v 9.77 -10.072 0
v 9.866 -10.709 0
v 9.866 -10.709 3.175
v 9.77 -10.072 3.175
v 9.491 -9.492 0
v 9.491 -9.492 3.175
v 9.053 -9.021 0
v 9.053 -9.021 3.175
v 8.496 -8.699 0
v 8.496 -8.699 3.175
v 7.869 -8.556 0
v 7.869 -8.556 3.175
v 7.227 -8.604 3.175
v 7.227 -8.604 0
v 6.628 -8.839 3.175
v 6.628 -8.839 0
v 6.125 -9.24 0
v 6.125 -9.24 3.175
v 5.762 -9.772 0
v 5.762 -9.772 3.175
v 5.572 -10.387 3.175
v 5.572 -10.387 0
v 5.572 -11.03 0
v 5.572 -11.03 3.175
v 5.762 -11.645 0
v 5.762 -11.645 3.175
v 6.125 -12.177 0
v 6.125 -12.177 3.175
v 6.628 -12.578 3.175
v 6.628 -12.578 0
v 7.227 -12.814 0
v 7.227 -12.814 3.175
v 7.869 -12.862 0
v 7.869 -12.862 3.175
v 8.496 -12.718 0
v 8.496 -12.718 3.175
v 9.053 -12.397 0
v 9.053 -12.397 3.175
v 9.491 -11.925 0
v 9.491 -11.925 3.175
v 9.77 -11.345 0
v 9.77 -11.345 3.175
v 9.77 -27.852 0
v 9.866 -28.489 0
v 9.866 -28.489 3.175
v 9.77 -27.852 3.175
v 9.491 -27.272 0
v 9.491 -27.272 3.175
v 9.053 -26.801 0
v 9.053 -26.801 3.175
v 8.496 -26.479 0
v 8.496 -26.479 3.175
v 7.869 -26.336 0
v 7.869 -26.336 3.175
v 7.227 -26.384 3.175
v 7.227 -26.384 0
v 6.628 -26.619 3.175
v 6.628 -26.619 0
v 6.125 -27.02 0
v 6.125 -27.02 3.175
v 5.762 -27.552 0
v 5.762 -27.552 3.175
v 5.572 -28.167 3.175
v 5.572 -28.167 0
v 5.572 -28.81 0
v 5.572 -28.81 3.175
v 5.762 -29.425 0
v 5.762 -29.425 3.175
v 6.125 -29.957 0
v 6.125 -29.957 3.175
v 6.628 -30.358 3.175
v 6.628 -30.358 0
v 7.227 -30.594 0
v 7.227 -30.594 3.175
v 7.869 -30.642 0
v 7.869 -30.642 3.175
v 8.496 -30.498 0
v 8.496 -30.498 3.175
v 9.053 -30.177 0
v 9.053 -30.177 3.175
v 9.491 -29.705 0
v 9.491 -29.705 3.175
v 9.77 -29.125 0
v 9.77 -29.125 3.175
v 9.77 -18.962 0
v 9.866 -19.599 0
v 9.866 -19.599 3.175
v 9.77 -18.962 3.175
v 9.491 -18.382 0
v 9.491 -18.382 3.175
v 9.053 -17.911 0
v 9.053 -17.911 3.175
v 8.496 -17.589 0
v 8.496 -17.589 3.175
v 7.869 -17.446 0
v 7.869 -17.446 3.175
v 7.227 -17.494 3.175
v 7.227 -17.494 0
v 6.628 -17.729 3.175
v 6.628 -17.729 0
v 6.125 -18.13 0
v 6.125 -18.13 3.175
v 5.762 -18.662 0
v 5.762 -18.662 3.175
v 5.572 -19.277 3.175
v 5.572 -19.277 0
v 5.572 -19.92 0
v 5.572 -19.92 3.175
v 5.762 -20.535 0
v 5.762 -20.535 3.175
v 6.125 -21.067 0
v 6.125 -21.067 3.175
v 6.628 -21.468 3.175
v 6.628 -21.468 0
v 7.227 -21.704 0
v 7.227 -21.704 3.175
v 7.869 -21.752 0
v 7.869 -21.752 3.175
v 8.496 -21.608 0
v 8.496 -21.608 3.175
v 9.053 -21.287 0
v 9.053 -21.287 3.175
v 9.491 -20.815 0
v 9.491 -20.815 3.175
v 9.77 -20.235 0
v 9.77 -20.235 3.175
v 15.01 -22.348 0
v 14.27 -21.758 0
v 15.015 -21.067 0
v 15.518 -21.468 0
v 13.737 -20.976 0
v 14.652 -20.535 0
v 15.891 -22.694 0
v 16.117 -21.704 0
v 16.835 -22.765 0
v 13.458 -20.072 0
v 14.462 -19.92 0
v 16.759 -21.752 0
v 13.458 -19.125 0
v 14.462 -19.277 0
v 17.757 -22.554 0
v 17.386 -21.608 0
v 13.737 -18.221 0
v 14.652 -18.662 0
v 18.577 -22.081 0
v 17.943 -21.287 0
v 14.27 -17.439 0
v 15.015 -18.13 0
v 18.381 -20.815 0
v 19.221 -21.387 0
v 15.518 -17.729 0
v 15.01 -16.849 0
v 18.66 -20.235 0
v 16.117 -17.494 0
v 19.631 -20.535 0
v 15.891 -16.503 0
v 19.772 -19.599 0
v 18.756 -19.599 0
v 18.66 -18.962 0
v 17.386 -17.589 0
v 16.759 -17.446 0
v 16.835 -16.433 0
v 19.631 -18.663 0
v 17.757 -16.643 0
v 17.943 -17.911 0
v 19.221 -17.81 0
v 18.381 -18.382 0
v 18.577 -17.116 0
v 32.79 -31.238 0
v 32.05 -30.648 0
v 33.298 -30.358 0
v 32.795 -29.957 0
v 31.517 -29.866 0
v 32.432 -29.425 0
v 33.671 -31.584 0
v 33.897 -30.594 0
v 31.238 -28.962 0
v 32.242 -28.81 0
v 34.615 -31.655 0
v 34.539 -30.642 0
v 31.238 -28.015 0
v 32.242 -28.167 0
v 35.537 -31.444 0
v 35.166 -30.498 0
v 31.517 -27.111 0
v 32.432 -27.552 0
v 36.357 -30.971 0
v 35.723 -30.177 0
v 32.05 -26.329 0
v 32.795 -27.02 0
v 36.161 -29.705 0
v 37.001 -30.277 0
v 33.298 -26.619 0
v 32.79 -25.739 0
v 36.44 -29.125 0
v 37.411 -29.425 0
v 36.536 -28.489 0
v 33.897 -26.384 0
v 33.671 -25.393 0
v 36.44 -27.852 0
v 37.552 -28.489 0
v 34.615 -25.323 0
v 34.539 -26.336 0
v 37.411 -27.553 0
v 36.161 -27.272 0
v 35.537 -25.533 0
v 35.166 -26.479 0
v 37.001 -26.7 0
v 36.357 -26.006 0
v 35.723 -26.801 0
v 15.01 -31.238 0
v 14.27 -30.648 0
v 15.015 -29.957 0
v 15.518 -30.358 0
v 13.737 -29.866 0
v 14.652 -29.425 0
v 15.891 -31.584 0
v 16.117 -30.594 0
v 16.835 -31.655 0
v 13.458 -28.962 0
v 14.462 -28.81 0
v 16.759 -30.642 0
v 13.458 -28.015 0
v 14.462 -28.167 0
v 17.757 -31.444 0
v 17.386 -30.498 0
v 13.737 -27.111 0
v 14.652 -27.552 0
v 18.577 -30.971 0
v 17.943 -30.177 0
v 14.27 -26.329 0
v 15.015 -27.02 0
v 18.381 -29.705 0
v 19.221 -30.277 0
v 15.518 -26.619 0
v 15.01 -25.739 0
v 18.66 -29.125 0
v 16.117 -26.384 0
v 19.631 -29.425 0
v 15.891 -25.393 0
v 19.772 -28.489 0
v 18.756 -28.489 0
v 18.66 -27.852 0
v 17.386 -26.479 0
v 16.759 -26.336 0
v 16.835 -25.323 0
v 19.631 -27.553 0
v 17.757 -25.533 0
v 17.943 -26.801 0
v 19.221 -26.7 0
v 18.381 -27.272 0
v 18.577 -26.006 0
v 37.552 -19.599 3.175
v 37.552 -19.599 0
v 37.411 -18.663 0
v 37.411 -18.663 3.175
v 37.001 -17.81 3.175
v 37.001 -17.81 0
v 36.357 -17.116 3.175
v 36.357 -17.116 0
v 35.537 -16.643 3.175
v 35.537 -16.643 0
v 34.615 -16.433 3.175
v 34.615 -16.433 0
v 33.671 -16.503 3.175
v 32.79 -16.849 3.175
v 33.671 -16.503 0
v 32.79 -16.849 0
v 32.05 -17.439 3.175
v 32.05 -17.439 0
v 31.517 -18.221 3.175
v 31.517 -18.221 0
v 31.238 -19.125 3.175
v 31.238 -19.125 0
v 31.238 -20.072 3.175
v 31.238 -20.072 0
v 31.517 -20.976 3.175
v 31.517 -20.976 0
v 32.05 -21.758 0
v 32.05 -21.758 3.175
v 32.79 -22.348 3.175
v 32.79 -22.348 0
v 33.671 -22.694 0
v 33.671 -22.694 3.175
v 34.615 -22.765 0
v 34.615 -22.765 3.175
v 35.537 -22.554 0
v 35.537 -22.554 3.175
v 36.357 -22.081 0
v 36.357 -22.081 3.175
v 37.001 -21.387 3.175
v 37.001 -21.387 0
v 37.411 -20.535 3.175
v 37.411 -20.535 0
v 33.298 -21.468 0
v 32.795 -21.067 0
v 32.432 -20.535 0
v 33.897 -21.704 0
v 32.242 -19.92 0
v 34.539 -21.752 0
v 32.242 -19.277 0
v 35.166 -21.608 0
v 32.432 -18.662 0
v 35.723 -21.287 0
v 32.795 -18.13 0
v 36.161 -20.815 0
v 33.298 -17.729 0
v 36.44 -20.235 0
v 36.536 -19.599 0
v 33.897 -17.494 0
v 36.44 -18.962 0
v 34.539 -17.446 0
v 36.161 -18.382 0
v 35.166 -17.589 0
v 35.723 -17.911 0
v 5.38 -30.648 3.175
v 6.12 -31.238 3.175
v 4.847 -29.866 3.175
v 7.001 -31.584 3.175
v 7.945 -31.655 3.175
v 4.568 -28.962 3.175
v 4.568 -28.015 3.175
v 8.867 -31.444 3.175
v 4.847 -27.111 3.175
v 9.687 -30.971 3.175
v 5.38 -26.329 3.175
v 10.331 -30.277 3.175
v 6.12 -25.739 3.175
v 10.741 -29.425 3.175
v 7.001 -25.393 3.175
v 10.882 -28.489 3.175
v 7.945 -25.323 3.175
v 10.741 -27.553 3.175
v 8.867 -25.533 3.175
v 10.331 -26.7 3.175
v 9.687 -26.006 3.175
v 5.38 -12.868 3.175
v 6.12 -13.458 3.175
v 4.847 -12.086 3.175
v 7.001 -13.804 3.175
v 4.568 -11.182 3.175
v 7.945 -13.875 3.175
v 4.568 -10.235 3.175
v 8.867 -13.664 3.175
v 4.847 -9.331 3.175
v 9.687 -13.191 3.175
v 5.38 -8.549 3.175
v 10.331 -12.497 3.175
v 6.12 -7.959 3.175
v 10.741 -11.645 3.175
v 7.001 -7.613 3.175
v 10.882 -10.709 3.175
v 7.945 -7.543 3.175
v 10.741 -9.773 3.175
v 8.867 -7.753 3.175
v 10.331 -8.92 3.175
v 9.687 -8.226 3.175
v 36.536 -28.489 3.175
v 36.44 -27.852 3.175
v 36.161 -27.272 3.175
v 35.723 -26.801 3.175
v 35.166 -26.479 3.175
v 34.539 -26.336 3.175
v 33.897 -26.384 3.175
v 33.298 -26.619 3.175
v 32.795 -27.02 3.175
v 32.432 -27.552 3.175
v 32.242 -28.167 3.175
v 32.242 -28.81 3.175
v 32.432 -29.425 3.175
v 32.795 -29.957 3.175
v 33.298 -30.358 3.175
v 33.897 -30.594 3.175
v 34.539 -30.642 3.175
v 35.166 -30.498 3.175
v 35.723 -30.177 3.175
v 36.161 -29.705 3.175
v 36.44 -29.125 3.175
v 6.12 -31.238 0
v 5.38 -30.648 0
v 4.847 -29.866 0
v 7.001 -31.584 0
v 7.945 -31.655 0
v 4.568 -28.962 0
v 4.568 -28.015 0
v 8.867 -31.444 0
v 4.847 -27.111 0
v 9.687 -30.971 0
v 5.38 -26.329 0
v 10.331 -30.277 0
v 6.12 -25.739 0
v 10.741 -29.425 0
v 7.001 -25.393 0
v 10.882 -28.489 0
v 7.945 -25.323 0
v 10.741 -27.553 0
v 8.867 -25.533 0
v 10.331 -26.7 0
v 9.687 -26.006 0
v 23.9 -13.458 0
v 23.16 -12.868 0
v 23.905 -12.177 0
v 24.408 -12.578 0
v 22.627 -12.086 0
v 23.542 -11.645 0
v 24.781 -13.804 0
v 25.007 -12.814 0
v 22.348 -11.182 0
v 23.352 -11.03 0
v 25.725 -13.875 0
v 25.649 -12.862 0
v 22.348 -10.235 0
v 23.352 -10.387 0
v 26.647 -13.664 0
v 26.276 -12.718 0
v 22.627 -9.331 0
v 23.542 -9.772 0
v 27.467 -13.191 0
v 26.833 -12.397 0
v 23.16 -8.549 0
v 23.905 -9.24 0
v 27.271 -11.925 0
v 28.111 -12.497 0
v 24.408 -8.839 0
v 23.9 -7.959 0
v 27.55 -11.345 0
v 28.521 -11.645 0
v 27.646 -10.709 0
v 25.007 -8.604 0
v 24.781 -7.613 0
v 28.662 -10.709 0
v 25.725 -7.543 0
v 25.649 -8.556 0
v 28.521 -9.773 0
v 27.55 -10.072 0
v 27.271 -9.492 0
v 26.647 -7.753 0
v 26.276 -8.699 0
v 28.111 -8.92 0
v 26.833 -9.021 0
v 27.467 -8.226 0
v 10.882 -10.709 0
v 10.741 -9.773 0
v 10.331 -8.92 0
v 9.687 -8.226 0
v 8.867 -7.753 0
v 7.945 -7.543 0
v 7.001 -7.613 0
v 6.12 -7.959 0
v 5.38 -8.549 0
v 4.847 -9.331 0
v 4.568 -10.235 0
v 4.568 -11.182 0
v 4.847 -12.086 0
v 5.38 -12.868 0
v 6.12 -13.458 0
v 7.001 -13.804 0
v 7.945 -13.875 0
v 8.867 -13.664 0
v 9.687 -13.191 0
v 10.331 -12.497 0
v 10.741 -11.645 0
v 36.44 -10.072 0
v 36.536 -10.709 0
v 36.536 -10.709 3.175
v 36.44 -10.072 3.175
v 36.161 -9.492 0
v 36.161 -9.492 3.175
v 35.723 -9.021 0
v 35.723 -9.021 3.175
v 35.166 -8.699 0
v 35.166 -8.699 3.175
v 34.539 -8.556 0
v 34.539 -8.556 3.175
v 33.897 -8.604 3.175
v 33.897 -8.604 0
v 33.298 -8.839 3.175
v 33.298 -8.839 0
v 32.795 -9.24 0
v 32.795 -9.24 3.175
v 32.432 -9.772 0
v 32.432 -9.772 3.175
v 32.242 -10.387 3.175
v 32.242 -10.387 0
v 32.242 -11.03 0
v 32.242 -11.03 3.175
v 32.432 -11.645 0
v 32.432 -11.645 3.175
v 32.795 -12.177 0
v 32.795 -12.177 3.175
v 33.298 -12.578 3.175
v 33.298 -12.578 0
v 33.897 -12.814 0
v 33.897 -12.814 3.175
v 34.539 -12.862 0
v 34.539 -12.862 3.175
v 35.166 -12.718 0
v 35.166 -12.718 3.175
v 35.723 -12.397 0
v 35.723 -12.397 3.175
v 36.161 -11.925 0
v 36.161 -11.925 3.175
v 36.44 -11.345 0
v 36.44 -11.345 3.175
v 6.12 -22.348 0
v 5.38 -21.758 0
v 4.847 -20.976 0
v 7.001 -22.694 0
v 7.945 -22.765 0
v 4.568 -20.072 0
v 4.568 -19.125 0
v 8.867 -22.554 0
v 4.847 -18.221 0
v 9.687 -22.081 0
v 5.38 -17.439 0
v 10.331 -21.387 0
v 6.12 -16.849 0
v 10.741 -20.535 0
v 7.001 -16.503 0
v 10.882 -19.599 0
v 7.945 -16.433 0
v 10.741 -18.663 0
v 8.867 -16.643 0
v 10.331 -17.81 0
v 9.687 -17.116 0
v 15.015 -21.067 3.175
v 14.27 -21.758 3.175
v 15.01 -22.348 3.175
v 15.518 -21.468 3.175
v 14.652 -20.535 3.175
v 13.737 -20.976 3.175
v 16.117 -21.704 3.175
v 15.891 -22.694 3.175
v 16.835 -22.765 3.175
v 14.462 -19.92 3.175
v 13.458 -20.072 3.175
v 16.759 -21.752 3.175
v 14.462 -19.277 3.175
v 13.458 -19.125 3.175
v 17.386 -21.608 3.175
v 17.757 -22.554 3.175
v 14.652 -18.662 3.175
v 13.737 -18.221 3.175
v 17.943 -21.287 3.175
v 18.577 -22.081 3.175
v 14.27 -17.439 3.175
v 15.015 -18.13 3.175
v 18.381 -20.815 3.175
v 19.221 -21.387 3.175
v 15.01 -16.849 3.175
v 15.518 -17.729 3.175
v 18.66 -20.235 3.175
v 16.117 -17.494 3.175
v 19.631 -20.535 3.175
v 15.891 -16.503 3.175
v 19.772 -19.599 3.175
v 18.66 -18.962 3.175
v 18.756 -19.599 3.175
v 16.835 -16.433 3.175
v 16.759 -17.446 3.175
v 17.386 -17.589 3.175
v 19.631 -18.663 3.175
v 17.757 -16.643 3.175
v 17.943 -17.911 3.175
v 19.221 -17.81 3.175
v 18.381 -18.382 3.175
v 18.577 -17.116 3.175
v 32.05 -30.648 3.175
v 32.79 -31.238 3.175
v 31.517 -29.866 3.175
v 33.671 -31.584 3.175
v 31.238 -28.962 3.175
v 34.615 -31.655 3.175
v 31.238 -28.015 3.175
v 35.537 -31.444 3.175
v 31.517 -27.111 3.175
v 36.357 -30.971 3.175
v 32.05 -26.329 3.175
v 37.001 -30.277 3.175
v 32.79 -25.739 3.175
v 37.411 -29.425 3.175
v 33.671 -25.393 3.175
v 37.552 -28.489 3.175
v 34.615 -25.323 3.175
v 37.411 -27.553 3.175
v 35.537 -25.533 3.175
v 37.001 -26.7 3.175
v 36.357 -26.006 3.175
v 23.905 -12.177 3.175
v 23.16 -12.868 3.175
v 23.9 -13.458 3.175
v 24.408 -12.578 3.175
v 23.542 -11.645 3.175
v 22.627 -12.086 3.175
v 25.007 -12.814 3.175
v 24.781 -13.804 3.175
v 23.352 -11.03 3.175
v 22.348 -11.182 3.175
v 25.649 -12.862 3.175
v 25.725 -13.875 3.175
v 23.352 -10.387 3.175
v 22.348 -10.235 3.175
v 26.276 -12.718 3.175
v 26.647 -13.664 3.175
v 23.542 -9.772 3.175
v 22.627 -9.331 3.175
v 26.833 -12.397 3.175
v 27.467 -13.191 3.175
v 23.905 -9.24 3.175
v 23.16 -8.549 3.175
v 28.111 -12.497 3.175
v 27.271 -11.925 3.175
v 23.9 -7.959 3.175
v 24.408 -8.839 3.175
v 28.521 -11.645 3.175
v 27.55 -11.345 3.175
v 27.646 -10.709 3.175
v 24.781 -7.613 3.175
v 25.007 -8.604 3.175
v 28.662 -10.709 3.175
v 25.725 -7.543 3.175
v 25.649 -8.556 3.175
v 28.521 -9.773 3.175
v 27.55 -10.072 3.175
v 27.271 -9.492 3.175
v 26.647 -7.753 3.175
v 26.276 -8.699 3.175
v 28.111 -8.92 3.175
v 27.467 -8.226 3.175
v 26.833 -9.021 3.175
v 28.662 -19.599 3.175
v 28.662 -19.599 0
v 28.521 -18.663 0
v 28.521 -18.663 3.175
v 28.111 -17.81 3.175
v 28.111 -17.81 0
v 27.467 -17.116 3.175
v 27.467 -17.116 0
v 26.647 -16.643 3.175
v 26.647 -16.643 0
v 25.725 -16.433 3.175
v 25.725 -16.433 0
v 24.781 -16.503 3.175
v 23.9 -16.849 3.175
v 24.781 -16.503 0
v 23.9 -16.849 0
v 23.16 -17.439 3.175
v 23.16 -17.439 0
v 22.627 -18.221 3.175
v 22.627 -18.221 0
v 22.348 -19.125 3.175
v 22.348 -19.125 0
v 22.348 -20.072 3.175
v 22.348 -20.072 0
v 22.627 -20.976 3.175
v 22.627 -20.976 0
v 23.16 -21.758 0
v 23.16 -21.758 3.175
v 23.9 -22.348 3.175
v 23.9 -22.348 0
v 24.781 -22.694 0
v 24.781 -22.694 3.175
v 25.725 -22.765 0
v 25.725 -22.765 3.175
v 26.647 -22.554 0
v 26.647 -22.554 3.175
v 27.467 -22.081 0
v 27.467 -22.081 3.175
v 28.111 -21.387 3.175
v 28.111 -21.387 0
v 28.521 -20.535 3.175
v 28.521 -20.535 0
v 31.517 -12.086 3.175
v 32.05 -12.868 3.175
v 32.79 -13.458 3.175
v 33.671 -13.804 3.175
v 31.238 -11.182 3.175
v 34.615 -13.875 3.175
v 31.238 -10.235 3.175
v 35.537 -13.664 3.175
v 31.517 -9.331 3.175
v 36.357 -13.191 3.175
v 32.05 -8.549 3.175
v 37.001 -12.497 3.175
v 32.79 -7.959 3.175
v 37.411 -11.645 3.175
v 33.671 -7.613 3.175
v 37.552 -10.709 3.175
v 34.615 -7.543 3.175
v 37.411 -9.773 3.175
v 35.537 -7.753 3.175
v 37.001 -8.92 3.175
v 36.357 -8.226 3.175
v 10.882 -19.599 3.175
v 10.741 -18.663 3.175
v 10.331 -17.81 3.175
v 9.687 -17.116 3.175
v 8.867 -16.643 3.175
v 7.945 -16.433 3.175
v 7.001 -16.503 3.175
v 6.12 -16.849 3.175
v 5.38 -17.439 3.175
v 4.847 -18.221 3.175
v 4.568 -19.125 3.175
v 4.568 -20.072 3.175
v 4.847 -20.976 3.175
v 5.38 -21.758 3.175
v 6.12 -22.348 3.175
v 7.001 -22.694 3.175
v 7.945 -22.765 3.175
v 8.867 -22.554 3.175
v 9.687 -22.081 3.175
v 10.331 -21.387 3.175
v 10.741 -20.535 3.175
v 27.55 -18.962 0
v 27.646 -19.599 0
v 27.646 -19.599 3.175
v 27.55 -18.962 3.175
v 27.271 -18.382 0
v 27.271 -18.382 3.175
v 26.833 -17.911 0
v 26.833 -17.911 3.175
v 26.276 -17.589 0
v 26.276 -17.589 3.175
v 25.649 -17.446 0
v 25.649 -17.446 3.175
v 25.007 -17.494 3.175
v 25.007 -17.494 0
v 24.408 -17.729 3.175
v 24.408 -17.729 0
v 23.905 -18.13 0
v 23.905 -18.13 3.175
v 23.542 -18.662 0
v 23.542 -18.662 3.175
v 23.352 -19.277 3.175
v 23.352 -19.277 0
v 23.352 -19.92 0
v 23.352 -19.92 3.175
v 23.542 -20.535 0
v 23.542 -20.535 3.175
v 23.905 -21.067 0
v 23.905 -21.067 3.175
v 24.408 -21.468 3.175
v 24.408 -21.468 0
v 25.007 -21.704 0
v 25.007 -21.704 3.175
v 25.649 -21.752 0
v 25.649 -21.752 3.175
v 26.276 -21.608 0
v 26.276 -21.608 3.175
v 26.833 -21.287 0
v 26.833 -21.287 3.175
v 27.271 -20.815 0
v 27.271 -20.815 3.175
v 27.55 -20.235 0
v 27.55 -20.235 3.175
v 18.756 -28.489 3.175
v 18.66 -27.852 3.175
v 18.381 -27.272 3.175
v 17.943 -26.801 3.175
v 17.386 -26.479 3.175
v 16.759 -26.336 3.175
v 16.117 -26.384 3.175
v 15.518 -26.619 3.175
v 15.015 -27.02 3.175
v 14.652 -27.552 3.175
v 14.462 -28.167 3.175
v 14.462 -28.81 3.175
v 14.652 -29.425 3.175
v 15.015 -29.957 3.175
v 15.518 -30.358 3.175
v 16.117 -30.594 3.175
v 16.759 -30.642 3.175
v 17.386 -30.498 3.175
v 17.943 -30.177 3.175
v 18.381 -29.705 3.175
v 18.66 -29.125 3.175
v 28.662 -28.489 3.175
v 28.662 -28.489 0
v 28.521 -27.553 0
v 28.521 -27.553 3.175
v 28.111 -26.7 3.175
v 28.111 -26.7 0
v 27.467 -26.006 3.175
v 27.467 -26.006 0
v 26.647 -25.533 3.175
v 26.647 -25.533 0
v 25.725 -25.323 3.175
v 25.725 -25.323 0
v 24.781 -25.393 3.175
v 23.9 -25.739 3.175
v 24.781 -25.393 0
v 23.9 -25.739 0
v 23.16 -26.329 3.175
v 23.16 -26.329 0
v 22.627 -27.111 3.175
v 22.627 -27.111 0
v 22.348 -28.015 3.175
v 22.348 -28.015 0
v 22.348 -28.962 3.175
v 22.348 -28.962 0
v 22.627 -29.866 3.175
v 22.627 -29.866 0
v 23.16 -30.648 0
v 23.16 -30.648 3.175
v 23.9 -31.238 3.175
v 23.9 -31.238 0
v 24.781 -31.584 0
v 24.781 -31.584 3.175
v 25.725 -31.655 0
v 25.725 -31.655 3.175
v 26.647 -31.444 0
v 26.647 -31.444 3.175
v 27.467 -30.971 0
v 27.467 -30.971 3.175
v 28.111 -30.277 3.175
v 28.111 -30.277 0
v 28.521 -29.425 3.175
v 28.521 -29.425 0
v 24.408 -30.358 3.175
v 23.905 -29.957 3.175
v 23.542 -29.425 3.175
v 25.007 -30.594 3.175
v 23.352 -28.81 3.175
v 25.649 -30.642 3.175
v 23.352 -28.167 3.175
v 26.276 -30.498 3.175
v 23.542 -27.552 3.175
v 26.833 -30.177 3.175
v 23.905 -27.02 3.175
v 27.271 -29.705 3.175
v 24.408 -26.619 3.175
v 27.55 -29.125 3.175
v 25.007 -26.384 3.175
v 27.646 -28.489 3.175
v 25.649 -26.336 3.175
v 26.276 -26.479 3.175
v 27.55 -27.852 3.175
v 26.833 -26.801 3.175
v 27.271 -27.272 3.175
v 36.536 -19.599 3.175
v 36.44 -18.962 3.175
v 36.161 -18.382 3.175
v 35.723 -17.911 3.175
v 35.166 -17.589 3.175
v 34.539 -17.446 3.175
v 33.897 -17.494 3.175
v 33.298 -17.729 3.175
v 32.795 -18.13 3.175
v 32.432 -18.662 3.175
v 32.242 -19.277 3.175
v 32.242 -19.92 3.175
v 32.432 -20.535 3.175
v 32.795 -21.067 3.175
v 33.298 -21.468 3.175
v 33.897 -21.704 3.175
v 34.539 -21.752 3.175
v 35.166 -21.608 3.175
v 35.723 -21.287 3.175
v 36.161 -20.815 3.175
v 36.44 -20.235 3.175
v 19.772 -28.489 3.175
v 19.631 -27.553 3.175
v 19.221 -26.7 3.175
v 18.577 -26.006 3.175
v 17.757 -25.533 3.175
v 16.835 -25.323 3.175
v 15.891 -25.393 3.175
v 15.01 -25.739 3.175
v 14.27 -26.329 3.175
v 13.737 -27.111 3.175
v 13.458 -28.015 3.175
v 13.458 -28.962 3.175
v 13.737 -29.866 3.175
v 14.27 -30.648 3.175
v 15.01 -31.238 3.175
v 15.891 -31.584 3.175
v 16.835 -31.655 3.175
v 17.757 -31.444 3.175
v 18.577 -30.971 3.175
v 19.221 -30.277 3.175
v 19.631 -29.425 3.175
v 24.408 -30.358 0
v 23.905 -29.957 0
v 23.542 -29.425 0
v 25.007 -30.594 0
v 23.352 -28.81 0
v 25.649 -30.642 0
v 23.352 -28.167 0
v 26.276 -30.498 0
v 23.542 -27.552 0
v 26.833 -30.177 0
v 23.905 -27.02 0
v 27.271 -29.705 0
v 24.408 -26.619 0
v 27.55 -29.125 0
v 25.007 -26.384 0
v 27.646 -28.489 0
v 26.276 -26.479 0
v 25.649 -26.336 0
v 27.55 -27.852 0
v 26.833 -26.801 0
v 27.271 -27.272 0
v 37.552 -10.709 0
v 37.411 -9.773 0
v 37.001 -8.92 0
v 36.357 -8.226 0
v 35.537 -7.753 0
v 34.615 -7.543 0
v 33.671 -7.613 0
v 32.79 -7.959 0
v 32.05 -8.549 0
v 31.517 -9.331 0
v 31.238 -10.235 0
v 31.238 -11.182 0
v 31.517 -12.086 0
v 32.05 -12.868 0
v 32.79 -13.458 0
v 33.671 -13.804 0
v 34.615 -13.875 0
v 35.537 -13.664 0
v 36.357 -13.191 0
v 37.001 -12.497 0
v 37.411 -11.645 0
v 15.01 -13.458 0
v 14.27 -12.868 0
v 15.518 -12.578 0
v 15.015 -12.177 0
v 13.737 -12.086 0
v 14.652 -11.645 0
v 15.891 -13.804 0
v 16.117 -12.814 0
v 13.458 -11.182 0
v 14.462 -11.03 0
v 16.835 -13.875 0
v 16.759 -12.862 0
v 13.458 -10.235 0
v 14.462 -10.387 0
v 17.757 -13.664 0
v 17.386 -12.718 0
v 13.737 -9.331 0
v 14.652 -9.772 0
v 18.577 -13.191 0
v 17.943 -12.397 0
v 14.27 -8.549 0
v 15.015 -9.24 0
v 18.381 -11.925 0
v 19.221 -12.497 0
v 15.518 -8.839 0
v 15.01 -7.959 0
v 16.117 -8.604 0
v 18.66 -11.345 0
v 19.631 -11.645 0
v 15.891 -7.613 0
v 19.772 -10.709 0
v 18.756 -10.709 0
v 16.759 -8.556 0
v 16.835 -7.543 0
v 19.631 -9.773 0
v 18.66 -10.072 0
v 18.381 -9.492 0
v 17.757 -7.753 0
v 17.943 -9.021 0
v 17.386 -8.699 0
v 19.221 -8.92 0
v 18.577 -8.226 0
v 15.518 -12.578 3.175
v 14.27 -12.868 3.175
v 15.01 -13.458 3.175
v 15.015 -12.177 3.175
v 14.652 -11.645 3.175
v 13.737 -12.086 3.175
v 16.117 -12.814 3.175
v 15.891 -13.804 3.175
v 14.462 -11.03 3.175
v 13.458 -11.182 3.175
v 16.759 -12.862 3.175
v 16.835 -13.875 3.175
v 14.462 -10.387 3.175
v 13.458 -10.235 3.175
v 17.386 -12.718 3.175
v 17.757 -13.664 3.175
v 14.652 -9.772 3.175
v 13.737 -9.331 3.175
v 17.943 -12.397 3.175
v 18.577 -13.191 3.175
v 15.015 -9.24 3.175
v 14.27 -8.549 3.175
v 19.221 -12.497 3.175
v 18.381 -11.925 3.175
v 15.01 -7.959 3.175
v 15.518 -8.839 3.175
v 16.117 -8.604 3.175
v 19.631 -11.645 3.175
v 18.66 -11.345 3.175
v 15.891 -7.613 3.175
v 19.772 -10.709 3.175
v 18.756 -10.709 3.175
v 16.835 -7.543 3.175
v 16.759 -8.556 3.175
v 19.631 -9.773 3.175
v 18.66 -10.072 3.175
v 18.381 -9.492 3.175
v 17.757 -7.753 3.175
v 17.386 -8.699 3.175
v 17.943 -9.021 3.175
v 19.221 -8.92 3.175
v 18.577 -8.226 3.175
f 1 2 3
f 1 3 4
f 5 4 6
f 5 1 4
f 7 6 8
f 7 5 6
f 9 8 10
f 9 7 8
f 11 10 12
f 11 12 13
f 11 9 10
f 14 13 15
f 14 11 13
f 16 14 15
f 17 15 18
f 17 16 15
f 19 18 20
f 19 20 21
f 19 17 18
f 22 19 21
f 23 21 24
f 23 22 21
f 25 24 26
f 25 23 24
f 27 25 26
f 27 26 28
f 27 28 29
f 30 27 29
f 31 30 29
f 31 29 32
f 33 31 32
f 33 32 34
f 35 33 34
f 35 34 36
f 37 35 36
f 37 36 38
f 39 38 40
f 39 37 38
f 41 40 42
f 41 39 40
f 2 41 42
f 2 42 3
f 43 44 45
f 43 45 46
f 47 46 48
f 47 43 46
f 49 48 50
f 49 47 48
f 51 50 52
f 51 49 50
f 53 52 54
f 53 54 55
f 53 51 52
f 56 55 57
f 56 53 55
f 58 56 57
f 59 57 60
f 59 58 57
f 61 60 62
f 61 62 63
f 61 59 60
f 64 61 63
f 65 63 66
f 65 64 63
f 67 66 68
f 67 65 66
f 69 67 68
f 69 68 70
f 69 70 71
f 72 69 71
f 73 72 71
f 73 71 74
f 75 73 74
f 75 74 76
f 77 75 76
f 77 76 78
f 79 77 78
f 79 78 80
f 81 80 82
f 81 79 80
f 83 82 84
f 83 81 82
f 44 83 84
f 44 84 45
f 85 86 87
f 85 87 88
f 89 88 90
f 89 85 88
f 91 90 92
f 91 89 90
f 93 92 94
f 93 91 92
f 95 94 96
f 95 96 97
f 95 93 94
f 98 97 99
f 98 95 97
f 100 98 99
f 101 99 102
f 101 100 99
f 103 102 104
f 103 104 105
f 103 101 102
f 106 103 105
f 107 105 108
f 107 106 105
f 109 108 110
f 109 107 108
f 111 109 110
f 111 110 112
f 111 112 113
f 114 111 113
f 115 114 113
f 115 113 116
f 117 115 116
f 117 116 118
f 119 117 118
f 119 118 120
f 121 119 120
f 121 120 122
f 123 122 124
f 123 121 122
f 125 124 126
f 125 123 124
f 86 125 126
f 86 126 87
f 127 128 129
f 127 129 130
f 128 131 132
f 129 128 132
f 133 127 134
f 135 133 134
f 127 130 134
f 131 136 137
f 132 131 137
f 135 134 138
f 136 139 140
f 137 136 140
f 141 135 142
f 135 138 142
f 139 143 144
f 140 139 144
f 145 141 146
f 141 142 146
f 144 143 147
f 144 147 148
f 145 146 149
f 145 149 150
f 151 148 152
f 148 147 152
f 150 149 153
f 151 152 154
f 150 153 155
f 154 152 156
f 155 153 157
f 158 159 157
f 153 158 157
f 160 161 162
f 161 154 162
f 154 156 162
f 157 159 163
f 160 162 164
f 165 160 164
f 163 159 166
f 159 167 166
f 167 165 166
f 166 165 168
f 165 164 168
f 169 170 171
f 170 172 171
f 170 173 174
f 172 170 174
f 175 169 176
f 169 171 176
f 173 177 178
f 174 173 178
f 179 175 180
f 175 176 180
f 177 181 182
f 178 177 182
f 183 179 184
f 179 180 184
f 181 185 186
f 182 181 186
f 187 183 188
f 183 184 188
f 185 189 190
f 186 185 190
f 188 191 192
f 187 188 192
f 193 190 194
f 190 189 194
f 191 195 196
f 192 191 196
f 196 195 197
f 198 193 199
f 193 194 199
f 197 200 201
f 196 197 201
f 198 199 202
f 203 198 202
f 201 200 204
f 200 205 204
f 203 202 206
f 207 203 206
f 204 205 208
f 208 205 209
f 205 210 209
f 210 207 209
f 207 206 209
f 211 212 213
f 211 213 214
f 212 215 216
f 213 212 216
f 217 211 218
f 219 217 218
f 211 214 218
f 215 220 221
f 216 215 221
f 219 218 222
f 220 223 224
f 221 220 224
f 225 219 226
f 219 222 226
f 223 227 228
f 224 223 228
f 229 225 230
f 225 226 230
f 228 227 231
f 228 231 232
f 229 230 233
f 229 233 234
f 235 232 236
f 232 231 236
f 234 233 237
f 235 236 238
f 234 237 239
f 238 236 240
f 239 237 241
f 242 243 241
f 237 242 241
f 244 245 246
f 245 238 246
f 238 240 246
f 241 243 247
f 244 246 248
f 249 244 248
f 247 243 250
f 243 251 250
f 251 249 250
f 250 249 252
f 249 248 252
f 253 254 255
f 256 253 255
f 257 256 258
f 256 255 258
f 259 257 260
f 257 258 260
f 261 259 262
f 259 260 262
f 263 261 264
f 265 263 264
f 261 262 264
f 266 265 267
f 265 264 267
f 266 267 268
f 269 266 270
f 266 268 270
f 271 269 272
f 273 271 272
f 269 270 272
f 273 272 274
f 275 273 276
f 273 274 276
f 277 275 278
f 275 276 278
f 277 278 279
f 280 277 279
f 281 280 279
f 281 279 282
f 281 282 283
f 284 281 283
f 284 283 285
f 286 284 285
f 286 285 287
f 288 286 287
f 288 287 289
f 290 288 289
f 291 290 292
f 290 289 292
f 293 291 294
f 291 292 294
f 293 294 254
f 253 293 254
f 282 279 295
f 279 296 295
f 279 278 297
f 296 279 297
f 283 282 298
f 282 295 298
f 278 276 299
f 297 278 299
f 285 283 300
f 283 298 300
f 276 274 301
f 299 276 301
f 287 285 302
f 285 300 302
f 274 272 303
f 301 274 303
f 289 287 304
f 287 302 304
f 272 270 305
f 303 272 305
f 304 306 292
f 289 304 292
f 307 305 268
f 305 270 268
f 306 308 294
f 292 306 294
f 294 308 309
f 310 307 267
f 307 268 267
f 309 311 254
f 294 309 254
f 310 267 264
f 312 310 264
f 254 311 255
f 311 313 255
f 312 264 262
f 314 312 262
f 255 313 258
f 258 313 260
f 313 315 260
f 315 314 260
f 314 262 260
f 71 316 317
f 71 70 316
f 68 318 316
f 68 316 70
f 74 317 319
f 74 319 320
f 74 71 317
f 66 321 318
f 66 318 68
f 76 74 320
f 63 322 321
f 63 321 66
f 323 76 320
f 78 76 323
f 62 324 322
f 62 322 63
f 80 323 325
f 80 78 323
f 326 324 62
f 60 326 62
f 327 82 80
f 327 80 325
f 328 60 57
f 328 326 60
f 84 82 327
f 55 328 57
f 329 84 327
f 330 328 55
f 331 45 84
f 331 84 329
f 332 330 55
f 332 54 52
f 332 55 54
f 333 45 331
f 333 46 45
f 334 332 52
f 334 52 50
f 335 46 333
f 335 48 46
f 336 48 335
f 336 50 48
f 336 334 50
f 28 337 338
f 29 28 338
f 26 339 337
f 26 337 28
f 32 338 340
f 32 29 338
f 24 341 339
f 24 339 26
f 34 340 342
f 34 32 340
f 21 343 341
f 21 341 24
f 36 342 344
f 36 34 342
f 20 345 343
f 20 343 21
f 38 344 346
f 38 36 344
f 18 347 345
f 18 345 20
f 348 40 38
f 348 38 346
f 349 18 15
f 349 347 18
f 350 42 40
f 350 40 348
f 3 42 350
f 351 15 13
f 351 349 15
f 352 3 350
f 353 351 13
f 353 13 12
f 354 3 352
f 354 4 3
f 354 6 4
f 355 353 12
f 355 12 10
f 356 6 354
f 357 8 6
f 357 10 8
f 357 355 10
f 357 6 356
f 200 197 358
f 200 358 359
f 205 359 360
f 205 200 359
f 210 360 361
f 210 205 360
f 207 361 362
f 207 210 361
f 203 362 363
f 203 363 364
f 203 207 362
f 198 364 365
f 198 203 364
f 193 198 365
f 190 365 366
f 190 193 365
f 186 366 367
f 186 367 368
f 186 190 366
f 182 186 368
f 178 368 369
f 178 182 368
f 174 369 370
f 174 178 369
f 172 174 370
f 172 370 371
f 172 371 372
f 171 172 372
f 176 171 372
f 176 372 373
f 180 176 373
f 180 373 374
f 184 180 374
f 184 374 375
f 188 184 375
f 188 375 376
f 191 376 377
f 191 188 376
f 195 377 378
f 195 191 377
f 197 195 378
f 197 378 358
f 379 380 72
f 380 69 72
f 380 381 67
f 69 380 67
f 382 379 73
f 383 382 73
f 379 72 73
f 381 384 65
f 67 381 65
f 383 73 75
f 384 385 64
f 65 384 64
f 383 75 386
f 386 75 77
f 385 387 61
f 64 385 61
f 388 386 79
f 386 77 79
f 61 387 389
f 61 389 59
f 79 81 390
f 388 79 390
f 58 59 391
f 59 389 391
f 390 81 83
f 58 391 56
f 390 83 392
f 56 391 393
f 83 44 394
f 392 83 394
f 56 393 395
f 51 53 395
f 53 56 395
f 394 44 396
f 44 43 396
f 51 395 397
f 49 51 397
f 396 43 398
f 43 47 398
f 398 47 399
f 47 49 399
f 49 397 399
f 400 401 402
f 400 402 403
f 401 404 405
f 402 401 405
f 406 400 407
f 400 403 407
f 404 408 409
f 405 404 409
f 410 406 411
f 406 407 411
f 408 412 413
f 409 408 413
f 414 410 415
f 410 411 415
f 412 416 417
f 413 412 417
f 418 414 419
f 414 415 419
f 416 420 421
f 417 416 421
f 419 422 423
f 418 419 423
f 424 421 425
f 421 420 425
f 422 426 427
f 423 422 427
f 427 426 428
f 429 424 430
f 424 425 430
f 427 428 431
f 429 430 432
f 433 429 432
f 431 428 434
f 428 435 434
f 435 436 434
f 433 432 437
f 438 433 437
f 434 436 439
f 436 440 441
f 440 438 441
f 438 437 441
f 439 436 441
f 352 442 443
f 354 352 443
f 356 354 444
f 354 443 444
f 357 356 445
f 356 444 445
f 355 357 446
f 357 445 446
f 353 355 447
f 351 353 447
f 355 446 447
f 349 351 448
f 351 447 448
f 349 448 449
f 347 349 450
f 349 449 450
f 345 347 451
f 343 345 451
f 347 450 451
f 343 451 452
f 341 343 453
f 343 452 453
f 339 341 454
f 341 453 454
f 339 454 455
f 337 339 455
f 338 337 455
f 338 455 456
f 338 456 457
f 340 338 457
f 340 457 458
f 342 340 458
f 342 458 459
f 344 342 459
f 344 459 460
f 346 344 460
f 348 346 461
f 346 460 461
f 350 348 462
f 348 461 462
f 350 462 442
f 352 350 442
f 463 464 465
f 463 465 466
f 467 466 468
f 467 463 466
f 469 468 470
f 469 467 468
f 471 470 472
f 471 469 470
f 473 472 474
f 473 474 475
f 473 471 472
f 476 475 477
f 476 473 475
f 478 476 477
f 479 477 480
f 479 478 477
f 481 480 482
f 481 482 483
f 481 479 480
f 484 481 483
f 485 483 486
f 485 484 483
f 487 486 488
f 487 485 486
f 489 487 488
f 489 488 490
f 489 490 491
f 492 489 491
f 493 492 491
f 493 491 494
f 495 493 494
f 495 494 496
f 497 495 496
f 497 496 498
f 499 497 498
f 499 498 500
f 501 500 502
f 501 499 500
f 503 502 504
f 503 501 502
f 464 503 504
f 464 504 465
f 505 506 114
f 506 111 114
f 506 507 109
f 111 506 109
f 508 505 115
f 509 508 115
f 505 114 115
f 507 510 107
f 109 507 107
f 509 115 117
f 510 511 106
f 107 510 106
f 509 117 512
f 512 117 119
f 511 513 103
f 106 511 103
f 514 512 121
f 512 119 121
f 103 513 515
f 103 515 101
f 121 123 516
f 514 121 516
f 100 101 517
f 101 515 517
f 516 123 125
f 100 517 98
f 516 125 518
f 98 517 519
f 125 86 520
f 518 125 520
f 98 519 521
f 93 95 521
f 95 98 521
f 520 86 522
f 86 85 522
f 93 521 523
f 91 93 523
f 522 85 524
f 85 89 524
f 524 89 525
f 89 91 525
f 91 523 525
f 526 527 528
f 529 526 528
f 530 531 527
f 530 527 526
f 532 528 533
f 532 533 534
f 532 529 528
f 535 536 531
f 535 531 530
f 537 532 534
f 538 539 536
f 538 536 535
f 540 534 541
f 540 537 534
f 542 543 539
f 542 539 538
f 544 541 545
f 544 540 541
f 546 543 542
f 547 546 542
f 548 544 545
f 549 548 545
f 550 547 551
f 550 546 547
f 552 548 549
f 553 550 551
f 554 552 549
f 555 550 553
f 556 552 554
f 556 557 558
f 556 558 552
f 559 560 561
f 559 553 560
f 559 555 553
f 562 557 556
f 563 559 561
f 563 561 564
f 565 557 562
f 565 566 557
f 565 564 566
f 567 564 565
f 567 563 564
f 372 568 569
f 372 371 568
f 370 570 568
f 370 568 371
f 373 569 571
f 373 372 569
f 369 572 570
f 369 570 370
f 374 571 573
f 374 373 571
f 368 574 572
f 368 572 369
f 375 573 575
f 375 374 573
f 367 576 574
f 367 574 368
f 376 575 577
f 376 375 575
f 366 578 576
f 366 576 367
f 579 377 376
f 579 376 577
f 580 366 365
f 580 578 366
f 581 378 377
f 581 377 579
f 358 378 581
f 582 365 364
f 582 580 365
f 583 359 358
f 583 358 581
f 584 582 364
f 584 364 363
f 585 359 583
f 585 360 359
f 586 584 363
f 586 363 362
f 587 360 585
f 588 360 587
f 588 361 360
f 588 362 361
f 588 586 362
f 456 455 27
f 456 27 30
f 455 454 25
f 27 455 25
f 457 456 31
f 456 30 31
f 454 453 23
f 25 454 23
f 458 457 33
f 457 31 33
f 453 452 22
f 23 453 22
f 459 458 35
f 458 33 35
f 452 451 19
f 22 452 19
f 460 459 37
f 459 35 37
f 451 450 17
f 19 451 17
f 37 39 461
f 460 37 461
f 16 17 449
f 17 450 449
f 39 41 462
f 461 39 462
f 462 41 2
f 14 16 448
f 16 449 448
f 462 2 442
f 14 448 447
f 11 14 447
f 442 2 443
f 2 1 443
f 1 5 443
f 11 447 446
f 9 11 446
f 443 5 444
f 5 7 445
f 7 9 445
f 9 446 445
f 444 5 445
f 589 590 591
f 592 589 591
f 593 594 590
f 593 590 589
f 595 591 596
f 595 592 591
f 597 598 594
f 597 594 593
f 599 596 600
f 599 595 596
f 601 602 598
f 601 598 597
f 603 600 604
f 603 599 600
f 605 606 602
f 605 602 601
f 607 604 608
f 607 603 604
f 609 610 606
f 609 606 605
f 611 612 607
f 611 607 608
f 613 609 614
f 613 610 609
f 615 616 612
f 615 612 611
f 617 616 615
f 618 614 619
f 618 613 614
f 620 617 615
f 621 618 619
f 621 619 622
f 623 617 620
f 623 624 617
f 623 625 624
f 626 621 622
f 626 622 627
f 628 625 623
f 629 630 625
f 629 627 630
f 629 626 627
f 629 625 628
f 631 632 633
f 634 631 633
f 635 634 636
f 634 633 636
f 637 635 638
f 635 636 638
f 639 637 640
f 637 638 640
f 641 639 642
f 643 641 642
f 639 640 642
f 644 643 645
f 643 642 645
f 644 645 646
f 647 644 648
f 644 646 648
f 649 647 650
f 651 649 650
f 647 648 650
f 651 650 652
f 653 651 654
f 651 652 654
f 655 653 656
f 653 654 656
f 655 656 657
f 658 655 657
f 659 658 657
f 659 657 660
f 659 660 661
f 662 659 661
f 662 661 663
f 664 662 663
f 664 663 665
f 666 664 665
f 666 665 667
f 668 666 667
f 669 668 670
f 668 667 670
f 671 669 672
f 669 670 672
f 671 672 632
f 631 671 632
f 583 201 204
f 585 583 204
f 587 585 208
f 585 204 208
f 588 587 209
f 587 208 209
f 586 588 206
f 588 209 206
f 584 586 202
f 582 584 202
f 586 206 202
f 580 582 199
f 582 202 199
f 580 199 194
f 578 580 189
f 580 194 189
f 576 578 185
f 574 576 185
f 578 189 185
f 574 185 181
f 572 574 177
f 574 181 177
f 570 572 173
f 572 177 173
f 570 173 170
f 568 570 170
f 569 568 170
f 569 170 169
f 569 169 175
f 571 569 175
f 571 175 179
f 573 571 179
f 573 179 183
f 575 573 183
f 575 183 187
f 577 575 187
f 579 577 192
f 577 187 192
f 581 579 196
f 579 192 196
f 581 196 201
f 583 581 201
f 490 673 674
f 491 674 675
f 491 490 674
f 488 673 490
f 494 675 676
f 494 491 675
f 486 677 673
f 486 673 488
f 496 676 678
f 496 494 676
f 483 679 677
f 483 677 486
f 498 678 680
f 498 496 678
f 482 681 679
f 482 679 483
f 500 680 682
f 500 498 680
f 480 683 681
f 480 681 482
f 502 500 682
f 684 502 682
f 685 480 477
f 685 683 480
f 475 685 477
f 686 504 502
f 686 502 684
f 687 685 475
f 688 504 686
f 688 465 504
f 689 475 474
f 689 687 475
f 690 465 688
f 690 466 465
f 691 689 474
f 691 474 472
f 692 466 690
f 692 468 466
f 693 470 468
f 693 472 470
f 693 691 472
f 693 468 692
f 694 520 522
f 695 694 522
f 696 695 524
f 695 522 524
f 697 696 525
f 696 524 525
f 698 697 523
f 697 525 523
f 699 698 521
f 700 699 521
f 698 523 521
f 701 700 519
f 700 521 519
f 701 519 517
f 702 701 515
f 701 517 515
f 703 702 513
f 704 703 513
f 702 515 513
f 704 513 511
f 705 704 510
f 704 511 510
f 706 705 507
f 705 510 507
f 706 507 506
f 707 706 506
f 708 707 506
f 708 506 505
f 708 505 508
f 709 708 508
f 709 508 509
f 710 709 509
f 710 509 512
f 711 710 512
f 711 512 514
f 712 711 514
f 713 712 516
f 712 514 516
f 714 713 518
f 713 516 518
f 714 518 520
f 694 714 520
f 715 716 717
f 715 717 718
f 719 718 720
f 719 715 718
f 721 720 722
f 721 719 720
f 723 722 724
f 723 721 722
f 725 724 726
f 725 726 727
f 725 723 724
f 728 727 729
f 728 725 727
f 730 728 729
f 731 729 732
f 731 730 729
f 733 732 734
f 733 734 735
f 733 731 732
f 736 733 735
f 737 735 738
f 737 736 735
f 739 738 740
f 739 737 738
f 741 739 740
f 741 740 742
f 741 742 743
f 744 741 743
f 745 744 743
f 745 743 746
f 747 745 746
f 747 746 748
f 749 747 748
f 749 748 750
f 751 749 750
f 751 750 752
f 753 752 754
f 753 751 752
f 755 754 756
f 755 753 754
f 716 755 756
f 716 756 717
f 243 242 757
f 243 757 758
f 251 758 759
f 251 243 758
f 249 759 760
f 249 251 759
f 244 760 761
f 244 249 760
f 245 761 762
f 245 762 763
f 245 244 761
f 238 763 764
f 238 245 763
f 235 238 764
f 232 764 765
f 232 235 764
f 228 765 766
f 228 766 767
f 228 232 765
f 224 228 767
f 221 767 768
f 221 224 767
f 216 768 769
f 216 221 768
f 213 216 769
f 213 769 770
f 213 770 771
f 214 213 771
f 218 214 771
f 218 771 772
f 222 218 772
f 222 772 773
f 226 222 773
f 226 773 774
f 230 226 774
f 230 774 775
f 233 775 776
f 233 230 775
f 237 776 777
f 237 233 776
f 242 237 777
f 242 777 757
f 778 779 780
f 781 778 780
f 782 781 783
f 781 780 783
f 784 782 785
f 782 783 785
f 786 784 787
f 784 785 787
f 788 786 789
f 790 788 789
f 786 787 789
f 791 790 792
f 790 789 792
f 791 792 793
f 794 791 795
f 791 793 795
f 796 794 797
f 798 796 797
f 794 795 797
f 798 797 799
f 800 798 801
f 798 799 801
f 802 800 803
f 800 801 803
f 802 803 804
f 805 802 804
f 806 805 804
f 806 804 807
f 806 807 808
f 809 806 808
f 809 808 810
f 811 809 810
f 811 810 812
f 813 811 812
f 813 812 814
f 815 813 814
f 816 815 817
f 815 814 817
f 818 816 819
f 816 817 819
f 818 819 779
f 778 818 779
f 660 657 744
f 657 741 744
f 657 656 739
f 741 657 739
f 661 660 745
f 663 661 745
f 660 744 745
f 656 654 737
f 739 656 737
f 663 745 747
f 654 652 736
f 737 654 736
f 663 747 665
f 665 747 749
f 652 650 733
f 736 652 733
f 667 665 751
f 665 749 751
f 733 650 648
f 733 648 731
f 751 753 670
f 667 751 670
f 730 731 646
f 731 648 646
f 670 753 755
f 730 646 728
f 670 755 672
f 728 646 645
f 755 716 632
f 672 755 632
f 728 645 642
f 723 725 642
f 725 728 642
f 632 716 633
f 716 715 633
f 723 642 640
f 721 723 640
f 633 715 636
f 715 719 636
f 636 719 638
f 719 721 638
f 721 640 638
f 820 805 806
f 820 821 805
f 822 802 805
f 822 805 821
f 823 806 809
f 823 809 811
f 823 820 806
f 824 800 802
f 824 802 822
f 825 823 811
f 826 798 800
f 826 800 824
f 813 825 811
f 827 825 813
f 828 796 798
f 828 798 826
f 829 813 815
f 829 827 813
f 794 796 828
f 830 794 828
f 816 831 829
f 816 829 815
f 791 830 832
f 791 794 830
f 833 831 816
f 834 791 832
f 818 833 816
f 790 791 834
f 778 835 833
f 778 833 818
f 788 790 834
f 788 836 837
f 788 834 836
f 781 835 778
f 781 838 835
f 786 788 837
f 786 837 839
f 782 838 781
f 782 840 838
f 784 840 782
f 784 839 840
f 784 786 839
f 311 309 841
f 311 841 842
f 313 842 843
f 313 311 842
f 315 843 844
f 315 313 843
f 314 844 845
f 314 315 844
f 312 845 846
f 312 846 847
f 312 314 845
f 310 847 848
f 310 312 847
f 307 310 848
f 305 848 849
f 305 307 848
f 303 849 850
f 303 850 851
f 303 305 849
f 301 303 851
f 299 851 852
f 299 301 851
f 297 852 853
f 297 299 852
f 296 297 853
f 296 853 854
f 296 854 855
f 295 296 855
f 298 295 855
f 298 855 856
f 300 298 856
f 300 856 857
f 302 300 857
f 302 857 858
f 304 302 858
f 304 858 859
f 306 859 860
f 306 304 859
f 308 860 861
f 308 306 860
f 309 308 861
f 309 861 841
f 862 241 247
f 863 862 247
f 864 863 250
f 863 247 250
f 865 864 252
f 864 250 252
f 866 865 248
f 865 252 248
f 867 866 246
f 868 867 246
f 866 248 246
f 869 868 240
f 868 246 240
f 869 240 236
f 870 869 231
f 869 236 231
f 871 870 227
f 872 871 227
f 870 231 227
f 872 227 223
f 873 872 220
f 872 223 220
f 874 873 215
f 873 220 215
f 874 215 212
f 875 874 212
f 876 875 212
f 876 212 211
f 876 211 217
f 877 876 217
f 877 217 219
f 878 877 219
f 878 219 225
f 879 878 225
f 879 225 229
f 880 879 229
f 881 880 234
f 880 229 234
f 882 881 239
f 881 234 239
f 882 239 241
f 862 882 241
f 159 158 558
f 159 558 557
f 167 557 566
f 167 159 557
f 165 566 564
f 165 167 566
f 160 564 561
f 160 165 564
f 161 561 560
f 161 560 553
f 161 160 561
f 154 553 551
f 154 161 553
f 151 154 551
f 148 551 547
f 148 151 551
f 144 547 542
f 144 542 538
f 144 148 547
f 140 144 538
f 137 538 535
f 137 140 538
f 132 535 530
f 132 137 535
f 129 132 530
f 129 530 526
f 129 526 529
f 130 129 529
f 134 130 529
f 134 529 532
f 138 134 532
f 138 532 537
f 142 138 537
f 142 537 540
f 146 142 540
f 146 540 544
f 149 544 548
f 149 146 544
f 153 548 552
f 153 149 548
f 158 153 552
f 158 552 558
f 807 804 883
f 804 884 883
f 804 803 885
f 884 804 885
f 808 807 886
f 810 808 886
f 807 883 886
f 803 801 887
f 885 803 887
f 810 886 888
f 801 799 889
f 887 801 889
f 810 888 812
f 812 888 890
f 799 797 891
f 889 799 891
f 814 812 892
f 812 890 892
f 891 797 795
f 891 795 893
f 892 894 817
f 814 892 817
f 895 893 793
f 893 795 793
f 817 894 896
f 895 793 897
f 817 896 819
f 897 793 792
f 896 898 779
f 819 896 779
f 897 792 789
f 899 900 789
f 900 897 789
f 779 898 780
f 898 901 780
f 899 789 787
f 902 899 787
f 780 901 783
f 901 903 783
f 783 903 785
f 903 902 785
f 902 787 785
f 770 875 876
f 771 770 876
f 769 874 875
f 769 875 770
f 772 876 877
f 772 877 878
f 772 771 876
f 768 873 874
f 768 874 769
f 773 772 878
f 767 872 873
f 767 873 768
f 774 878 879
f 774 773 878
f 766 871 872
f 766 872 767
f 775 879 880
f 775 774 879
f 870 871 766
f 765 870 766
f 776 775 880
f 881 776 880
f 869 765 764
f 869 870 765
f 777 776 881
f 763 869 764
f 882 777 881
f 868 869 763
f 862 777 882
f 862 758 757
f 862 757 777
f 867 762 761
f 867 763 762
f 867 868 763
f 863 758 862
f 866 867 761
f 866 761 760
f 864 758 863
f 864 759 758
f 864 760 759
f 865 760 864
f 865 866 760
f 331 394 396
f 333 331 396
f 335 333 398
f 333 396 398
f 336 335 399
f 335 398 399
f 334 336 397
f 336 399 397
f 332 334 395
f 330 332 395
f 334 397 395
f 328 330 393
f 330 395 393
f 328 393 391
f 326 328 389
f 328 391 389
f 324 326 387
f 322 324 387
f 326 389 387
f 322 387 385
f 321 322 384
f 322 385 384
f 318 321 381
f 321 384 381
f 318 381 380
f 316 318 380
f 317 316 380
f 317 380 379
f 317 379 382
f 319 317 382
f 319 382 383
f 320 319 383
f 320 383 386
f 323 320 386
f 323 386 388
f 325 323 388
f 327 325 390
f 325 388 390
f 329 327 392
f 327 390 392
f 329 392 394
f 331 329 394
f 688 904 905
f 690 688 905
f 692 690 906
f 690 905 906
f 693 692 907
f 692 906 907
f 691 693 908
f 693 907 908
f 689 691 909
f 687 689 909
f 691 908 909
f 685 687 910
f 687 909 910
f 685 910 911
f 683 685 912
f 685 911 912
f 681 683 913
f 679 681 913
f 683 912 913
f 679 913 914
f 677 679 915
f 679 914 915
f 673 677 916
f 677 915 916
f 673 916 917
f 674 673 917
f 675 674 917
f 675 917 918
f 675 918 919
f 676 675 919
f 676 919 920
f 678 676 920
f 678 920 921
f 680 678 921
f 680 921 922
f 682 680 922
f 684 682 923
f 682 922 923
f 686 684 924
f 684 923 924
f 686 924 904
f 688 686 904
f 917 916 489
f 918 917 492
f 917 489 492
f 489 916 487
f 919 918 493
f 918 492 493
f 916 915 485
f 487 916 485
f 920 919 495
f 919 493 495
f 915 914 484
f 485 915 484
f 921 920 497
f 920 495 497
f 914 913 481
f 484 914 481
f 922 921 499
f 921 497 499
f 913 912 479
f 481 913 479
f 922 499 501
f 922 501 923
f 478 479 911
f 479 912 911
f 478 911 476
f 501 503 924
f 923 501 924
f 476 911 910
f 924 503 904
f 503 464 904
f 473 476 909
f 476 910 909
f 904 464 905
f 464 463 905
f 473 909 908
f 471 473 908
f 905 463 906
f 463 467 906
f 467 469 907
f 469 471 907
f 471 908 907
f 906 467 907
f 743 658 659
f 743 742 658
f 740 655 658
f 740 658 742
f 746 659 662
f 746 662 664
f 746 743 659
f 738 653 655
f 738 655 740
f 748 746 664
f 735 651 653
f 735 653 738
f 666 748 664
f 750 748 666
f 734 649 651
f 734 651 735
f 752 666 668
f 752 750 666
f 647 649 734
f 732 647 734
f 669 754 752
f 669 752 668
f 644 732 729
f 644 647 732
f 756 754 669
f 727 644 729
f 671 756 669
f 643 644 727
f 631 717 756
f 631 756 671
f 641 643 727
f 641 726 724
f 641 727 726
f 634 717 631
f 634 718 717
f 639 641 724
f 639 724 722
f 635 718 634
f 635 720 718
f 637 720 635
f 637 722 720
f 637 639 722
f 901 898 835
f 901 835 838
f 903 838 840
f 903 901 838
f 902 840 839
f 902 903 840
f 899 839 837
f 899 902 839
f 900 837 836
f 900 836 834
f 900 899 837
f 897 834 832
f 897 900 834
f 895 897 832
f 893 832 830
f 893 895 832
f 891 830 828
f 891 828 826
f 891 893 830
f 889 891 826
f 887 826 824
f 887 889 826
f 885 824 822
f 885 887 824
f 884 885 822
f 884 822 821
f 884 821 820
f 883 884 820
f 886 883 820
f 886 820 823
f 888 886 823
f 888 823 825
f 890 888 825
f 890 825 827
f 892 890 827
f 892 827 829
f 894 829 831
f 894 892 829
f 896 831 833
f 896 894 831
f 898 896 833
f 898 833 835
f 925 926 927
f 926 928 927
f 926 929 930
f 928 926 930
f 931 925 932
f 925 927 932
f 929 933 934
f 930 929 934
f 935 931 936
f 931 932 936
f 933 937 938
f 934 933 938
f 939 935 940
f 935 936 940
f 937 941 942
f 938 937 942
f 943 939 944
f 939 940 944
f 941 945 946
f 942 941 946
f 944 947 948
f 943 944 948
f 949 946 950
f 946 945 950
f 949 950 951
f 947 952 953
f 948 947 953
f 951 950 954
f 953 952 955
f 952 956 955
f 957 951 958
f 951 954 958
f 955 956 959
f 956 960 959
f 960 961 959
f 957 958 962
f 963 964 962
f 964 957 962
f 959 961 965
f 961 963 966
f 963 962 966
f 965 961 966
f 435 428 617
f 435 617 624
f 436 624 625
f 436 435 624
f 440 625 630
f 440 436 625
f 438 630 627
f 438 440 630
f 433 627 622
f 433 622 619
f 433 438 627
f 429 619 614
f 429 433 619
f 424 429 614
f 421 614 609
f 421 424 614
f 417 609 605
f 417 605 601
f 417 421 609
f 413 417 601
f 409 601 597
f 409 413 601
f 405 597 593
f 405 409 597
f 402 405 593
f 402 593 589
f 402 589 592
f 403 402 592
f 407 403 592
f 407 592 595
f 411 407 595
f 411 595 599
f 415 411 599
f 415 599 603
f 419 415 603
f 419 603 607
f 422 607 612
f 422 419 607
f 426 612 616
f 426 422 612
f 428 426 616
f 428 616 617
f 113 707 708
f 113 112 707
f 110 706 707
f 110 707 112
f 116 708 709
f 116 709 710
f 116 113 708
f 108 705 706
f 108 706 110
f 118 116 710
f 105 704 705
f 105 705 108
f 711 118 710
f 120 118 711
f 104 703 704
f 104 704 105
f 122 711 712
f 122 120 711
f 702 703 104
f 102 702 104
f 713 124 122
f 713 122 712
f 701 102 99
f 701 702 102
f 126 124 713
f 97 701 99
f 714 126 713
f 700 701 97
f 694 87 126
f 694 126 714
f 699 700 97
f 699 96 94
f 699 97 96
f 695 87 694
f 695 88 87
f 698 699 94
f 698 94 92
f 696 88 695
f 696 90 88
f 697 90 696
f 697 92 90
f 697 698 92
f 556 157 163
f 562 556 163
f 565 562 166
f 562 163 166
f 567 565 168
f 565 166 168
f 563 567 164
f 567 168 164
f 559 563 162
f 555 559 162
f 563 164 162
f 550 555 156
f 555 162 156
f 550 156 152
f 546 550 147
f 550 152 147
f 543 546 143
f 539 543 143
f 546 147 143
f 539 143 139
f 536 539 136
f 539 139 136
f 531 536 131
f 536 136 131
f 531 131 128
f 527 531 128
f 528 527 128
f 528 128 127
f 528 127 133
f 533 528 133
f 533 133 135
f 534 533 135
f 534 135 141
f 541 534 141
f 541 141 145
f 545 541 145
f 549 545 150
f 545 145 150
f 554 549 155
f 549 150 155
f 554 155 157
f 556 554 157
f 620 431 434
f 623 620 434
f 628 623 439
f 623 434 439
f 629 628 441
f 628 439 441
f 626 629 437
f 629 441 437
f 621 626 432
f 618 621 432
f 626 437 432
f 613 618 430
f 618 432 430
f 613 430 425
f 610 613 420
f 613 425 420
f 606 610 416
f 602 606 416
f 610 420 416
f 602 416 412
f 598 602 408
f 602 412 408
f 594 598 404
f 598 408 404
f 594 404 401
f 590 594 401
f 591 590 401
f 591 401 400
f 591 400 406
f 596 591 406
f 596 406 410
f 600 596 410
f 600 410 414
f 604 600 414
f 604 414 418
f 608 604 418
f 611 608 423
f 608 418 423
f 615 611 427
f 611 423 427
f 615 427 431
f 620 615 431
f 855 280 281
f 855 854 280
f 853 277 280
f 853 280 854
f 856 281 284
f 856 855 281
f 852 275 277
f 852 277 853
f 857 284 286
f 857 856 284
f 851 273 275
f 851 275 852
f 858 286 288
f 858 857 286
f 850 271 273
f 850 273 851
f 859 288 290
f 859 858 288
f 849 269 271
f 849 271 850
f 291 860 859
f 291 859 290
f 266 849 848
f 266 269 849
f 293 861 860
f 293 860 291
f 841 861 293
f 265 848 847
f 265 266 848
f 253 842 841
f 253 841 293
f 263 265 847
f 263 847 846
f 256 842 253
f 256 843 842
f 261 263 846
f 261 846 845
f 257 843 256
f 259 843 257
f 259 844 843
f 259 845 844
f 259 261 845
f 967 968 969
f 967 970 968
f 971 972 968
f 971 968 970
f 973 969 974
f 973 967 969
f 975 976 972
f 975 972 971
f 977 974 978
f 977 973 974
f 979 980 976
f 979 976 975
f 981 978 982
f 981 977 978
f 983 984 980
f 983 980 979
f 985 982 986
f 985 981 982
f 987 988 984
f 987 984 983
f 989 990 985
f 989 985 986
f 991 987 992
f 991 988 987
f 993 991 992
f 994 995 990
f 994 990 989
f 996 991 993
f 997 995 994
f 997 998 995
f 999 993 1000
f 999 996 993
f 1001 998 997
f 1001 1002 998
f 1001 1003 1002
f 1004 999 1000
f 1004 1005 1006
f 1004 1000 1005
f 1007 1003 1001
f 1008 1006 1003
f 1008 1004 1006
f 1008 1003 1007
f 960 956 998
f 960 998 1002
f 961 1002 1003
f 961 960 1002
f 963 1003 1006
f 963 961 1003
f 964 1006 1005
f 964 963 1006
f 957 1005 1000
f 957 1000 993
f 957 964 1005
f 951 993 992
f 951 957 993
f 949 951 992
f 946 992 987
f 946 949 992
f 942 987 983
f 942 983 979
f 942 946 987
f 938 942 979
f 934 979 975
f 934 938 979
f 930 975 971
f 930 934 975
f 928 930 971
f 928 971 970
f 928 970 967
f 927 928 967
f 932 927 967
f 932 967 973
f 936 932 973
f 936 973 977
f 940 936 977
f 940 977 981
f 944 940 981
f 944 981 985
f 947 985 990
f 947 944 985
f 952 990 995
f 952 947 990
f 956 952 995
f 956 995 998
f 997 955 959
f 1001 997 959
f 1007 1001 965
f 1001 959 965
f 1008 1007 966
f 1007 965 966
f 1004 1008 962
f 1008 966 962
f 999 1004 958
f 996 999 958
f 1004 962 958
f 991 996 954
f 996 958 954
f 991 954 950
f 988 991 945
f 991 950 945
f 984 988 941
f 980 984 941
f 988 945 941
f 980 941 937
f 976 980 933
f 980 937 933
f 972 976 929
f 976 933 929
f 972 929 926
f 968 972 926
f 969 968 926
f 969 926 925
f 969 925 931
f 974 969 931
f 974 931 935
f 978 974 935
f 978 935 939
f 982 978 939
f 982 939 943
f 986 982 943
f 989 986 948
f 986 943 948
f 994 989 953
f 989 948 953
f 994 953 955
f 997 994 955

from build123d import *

# Parameters (mm, degrees)
F0_R     = 3.175
F0_R_2   = 2.159
F1_DEPTH = 3.175


with BuildPart() as f1:
    # F0 (on Top) → F1 (new body)
    with BuildSketch(Plane.XY):
        with Locations((25.487235, -19.598674)):
            Circle(F0_R)
        with Locations((25.487235, -19.598674)):
            Circle(F0_R_2, mode=Mode.SUBTRACT)
        with Locations((16.597235, -19.598674)):
            Circle(F0_R)
        with Locations((16.597235, -19.598674)):
            Circle(F0_R_2, mode=Mode.SUBTRACT)
        with Locations((25.487235, -10.708674)):
            Circle(F0_R)
        with Locations((25.487235, -10.708674)):
            Circle(F0_R_2, mode=Mode.SUBTRACT)
        with Locations((16.597235, -10.708674)):
            Circle(F0_R)
        with Locations((16.597235, -10.708674)):
            Circle(F0_R_2, mode=Mode.SUBTRACT)
        with Locations((7.707235, -10.708674)):
            Circle(F0_R)
        with Locations((7.707235, -10.708674)):
            Circle(F0_R_2, mode=Mode.SUBTRACT)
        with Locations((7.707235, -19.598674)):
            Circle(F0_R)
        with Locations((7.707235, -19.598674)):
            Circle(F0_R_2, mode=Mode.SUBTRACT)
        with Locations((7.707235, -28.488674)):
            Circle(F0_R)
        with Locations((7.707235, -28.488674)):
            Circle(F0_R_2, mode=Mode.SUBTRACT)
        with Locations((16.597235, -28.488674)):
            Circle(F0_R)
        with Locations((16.597235, -28.488674)):
            Circle(F0_R_2, mode=Mode.SUBTRACT)
        with Locations((25.487235, -28.488674)):
            Circle(F0_R)
        with Locations((25.487235, -28.488674)):
            Circle(F0_R_2, mode=Mode.SUBTRACT)
        with Locations((34.377235, -10.708674)):
            Circle(F0_R)
        with Locations((34.377235, -10.708674)):
            Circle(F0_R_2, mode=Mode.SUBTRACT)
        with Locations((34.377235, -19.598674)):
            Circle(F0_R)
        with Locations((34.377235, -19.598674)):
            Circle(F0_R_2, mode=Mode.SUBTRACT)
        with Locations((34.377235, -28.488674)):
            Circle(F0_R)
        with Locations((34.377235, -28.488674)):
            Circle(F0_R_2, mode=Mode.SUBTRACT)
    extrude(amount=F1_DEPTH)


solid = f1.part
